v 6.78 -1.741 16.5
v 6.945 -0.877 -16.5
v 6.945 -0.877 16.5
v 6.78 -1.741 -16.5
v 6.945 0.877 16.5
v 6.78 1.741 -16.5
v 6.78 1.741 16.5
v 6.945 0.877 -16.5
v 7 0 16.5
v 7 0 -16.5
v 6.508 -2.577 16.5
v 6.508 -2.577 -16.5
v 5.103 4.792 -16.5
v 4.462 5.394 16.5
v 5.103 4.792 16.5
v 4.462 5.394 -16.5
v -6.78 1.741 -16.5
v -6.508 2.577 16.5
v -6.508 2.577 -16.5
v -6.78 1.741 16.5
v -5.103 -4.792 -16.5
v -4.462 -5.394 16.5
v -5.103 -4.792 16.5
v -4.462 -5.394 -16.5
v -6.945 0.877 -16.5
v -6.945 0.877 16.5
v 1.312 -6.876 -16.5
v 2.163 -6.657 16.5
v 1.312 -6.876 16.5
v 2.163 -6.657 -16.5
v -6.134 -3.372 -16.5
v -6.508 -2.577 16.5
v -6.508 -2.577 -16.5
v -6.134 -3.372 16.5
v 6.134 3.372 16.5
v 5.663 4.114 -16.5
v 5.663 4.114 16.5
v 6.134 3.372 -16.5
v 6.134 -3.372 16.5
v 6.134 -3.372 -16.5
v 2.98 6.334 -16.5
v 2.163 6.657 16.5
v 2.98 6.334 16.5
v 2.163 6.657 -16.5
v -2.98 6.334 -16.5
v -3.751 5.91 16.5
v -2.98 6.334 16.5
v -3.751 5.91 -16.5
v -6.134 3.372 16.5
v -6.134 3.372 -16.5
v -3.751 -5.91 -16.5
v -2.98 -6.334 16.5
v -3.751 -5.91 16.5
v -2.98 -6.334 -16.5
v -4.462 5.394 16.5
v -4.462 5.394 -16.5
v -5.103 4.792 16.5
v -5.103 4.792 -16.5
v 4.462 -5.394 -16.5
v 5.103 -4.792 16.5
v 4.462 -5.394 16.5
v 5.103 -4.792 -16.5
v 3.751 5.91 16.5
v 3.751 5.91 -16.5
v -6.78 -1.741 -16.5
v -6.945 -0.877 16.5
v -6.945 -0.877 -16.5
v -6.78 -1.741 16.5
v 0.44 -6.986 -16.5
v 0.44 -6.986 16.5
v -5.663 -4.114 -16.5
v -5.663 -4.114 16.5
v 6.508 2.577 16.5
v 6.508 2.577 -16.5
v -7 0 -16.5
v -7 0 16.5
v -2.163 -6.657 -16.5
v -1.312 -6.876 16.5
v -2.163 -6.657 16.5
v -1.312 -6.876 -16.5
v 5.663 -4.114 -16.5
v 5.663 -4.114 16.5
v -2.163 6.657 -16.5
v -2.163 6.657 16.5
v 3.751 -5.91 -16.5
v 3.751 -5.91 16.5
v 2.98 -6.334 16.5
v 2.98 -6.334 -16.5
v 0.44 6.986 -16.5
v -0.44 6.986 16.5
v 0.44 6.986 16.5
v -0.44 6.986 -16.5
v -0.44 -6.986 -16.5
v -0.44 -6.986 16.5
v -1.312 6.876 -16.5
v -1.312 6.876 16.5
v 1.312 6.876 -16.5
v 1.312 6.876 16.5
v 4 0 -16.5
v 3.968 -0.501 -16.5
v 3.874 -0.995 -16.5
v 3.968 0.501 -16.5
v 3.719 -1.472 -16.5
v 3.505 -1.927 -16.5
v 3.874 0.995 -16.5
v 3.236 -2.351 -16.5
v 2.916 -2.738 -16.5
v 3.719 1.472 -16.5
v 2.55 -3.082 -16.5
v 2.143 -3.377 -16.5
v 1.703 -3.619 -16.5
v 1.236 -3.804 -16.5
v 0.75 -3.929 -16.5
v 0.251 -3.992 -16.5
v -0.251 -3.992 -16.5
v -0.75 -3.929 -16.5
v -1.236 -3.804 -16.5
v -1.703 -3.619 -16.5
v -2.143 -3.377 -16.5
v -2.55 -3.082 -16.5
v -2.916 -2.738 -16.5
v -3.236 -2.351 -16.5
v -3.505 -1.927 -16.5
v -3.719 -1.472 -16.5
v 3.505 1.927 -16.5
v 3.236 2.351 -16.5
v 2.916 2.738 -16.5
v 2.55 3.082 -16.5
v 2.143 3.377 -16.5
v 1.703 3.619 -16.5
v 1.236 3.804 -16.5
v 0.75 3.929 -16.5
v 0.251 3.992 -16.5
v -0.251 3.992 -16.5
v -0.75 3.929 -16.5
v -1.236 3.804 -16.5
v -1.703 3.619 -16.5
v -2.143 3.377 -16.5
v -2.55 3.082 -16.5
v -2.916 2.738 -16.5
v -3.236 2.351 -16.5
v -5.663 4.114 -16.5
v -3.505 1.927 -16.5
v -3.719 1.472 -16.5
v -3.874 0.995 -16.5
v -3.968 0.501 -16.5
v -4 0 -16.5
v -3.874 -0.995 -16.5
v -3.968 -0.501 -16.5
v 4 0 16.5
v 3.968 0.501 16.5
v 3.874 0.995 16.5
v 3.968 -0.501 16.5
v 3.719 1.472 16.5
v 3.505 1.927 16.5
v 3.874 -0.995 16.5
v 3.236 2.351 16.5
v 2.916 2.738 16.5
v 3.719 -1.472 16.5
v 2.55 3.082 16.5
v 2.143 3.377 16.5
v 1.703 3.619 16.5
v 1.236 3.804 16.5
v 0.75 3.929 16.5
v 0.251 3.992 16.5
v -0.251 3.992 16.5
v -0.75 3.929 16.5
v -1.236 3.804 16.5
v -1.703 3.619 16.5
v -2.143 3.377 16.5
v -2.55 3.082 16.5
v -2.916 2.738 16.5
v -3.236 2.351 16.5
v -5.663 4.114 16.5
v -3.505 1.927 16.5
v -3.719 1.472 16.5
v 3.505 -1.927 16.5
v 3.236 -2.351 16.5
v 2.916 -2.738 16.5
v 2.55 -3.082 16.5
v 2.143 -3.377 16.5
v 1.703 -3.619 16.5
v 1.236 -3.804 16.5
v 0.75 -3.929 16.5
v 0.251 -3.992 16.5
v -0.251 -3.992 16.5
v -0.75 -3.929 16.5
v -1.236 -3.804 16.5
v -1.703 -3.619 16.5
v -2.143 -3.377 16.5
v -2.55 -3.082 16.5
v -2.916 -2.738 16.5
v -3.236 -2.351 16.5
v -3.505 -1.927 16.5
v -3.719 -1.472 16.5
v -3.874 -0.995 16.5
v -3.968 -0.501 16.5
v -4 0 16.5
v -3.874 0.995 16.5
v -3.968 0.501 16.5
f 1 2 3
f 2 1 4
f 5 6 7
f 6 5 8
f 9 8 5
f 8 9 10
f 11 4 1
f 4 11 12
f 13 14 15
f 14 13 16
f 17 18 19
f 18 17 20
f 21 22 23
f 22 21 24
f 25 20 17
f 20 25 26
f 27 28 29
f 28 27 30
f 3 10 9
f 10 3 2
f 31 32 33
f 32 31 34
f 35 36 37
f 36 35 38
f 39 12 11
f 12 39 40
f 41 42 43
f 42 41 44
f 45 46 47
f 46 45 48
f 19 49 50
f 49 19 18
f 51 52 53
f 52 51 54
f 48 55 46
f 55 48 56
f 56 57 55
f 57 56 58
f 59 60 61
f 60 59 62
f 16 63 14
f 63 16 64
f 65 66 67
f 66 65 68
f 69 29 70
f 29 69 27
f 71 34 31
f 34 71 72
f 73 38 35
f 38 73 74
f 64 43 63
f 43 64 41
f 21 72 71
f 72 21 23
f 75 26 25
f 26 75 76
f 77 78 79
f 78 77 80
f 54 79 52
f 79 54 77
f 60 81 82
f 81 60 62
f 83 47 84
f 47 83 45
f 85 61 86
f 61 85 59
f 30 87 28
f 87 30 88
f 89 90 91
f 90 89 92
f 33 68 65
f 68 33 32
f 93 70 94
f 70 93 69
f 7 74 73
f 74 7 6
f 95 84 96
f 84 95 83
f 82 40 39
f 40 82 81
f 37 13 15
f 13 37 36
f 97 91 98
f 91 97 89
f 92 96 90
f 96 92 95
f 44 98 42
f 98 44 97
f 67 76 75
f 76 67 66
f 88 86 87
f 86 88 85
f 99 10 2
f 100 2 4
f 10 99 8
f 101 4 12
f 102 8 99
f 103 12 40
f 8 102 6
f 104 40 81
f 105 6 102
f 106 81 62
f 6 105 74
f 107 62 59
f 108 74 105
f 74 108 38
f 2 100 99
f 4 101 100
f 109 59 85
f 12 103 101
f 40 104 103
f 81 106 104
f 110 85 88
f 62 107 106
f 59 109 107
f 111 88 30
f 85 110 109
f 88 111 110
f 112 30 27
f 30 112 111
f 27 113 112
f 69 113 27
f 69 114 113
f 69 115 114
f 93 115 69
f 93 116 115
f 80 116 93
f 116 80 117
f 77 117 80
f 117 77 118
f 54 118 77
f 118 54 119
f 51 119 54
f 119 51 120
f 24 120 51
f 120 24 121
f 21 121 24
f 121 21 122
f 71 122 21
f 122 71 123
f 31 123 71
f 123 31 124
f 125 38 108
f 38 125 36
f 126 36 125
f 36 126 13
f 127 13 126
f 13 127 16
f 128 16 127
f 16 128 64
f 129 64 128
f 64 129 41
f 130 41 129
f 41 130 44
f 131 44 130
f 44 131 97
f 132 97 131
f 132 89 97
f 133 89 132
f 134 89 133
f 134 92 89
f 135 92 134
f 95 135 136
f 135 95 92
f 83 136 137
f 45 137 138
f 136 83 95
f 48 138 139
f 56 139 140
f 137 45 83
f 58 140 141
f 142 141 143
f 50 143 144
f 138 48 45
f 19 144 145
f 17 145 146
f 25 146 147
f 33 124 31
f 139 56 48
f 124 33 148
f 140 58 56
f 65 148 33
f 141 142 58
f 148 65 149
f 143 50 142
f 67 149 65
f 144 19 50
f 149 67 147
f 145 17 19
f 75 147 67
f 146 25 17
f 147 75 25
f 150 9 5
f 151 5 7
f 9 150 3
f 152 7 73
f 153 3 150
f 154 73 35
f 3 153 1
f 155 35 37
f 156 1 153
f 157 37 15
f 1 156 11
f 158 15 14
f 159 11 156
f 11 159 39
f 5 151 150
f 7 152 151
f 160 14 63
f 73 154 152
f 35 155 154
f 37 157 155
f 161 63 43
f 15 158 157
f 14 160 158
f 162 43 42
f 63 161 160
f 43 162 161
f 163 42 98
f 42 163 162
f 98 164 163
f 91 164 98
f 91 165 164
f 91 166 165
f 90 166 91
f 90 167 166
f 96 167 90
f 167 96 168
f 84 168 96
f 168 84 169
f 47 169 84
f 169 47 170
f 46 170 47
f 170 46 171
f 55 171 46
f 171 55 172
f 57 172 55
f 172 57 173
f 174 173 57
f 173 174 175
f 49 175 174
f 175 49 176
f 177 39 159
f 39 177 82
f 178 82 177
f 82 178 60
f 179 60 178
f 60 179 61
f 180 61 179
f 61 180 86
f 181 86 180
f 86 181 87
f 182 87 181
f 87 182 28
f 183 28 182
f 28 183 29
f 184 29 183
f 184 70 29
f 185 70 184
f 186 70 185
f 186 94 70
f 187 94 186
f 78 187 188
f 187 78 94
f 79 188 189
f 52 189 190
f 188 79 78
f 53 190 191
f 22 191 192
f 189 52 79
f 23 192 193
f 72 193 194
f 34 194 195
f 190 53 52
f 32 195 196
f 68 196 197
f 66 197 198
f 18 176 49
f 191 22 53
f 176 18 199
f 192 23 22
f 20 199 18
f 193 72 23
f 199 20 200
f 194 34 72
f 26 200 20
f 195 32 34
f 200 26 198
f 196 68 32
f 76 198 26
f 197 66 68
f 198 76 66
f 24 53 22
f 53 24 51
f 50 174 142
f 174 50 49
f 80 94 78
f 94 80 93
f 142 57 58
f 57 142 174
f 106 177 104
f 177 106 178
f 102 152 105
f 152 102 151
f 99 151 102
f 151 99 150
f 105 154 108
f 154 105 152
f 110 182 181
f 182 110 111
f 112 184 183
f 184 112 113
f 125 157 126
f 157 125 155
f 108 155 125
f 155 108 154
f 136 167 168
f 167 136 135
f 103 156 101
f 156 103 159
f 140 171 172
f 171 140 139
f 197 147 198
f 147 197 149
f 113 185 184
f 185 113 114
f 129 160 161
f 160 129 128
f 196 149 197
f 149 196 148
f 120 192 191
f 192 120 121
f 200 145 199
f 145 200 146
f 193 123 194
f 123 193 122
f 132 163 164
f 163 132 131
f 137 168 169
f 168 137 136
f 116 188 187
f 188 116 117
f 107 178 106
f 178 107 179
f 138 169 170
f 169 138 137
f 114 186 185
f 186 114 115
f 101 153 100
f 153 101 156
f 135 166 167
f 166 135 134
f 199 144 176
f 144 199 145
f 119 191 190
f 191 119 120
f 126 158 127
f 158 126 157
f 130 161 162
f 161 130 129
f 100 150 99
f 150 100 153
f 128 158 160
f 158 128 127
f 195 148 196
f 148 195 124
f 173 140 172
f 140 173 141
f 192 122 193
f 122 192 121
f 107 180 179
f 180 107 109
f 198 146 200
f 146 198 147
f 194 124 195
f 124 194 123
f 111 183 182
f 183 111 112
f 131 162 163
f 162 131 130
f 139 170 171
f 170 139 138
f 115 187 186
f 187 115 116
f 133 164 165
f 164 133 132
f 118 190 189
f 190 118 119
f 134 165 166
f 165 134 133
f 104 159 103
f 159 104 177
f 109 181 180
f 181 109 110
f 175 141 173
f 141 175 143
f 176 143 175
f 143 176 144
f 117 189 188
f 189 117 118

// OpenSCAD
$fn = 50;


difference() {
	union() {
		translate(v = [0, 0, -16.5000000000]) {
			cylinder(h = 33, r = 7.0000000000);
		}
	}
	union() {
		translate(v = [0, 0, -100.0000000000]) {
			cylinder(h = 200, r = 4.0000000000);
		}
	}
}
